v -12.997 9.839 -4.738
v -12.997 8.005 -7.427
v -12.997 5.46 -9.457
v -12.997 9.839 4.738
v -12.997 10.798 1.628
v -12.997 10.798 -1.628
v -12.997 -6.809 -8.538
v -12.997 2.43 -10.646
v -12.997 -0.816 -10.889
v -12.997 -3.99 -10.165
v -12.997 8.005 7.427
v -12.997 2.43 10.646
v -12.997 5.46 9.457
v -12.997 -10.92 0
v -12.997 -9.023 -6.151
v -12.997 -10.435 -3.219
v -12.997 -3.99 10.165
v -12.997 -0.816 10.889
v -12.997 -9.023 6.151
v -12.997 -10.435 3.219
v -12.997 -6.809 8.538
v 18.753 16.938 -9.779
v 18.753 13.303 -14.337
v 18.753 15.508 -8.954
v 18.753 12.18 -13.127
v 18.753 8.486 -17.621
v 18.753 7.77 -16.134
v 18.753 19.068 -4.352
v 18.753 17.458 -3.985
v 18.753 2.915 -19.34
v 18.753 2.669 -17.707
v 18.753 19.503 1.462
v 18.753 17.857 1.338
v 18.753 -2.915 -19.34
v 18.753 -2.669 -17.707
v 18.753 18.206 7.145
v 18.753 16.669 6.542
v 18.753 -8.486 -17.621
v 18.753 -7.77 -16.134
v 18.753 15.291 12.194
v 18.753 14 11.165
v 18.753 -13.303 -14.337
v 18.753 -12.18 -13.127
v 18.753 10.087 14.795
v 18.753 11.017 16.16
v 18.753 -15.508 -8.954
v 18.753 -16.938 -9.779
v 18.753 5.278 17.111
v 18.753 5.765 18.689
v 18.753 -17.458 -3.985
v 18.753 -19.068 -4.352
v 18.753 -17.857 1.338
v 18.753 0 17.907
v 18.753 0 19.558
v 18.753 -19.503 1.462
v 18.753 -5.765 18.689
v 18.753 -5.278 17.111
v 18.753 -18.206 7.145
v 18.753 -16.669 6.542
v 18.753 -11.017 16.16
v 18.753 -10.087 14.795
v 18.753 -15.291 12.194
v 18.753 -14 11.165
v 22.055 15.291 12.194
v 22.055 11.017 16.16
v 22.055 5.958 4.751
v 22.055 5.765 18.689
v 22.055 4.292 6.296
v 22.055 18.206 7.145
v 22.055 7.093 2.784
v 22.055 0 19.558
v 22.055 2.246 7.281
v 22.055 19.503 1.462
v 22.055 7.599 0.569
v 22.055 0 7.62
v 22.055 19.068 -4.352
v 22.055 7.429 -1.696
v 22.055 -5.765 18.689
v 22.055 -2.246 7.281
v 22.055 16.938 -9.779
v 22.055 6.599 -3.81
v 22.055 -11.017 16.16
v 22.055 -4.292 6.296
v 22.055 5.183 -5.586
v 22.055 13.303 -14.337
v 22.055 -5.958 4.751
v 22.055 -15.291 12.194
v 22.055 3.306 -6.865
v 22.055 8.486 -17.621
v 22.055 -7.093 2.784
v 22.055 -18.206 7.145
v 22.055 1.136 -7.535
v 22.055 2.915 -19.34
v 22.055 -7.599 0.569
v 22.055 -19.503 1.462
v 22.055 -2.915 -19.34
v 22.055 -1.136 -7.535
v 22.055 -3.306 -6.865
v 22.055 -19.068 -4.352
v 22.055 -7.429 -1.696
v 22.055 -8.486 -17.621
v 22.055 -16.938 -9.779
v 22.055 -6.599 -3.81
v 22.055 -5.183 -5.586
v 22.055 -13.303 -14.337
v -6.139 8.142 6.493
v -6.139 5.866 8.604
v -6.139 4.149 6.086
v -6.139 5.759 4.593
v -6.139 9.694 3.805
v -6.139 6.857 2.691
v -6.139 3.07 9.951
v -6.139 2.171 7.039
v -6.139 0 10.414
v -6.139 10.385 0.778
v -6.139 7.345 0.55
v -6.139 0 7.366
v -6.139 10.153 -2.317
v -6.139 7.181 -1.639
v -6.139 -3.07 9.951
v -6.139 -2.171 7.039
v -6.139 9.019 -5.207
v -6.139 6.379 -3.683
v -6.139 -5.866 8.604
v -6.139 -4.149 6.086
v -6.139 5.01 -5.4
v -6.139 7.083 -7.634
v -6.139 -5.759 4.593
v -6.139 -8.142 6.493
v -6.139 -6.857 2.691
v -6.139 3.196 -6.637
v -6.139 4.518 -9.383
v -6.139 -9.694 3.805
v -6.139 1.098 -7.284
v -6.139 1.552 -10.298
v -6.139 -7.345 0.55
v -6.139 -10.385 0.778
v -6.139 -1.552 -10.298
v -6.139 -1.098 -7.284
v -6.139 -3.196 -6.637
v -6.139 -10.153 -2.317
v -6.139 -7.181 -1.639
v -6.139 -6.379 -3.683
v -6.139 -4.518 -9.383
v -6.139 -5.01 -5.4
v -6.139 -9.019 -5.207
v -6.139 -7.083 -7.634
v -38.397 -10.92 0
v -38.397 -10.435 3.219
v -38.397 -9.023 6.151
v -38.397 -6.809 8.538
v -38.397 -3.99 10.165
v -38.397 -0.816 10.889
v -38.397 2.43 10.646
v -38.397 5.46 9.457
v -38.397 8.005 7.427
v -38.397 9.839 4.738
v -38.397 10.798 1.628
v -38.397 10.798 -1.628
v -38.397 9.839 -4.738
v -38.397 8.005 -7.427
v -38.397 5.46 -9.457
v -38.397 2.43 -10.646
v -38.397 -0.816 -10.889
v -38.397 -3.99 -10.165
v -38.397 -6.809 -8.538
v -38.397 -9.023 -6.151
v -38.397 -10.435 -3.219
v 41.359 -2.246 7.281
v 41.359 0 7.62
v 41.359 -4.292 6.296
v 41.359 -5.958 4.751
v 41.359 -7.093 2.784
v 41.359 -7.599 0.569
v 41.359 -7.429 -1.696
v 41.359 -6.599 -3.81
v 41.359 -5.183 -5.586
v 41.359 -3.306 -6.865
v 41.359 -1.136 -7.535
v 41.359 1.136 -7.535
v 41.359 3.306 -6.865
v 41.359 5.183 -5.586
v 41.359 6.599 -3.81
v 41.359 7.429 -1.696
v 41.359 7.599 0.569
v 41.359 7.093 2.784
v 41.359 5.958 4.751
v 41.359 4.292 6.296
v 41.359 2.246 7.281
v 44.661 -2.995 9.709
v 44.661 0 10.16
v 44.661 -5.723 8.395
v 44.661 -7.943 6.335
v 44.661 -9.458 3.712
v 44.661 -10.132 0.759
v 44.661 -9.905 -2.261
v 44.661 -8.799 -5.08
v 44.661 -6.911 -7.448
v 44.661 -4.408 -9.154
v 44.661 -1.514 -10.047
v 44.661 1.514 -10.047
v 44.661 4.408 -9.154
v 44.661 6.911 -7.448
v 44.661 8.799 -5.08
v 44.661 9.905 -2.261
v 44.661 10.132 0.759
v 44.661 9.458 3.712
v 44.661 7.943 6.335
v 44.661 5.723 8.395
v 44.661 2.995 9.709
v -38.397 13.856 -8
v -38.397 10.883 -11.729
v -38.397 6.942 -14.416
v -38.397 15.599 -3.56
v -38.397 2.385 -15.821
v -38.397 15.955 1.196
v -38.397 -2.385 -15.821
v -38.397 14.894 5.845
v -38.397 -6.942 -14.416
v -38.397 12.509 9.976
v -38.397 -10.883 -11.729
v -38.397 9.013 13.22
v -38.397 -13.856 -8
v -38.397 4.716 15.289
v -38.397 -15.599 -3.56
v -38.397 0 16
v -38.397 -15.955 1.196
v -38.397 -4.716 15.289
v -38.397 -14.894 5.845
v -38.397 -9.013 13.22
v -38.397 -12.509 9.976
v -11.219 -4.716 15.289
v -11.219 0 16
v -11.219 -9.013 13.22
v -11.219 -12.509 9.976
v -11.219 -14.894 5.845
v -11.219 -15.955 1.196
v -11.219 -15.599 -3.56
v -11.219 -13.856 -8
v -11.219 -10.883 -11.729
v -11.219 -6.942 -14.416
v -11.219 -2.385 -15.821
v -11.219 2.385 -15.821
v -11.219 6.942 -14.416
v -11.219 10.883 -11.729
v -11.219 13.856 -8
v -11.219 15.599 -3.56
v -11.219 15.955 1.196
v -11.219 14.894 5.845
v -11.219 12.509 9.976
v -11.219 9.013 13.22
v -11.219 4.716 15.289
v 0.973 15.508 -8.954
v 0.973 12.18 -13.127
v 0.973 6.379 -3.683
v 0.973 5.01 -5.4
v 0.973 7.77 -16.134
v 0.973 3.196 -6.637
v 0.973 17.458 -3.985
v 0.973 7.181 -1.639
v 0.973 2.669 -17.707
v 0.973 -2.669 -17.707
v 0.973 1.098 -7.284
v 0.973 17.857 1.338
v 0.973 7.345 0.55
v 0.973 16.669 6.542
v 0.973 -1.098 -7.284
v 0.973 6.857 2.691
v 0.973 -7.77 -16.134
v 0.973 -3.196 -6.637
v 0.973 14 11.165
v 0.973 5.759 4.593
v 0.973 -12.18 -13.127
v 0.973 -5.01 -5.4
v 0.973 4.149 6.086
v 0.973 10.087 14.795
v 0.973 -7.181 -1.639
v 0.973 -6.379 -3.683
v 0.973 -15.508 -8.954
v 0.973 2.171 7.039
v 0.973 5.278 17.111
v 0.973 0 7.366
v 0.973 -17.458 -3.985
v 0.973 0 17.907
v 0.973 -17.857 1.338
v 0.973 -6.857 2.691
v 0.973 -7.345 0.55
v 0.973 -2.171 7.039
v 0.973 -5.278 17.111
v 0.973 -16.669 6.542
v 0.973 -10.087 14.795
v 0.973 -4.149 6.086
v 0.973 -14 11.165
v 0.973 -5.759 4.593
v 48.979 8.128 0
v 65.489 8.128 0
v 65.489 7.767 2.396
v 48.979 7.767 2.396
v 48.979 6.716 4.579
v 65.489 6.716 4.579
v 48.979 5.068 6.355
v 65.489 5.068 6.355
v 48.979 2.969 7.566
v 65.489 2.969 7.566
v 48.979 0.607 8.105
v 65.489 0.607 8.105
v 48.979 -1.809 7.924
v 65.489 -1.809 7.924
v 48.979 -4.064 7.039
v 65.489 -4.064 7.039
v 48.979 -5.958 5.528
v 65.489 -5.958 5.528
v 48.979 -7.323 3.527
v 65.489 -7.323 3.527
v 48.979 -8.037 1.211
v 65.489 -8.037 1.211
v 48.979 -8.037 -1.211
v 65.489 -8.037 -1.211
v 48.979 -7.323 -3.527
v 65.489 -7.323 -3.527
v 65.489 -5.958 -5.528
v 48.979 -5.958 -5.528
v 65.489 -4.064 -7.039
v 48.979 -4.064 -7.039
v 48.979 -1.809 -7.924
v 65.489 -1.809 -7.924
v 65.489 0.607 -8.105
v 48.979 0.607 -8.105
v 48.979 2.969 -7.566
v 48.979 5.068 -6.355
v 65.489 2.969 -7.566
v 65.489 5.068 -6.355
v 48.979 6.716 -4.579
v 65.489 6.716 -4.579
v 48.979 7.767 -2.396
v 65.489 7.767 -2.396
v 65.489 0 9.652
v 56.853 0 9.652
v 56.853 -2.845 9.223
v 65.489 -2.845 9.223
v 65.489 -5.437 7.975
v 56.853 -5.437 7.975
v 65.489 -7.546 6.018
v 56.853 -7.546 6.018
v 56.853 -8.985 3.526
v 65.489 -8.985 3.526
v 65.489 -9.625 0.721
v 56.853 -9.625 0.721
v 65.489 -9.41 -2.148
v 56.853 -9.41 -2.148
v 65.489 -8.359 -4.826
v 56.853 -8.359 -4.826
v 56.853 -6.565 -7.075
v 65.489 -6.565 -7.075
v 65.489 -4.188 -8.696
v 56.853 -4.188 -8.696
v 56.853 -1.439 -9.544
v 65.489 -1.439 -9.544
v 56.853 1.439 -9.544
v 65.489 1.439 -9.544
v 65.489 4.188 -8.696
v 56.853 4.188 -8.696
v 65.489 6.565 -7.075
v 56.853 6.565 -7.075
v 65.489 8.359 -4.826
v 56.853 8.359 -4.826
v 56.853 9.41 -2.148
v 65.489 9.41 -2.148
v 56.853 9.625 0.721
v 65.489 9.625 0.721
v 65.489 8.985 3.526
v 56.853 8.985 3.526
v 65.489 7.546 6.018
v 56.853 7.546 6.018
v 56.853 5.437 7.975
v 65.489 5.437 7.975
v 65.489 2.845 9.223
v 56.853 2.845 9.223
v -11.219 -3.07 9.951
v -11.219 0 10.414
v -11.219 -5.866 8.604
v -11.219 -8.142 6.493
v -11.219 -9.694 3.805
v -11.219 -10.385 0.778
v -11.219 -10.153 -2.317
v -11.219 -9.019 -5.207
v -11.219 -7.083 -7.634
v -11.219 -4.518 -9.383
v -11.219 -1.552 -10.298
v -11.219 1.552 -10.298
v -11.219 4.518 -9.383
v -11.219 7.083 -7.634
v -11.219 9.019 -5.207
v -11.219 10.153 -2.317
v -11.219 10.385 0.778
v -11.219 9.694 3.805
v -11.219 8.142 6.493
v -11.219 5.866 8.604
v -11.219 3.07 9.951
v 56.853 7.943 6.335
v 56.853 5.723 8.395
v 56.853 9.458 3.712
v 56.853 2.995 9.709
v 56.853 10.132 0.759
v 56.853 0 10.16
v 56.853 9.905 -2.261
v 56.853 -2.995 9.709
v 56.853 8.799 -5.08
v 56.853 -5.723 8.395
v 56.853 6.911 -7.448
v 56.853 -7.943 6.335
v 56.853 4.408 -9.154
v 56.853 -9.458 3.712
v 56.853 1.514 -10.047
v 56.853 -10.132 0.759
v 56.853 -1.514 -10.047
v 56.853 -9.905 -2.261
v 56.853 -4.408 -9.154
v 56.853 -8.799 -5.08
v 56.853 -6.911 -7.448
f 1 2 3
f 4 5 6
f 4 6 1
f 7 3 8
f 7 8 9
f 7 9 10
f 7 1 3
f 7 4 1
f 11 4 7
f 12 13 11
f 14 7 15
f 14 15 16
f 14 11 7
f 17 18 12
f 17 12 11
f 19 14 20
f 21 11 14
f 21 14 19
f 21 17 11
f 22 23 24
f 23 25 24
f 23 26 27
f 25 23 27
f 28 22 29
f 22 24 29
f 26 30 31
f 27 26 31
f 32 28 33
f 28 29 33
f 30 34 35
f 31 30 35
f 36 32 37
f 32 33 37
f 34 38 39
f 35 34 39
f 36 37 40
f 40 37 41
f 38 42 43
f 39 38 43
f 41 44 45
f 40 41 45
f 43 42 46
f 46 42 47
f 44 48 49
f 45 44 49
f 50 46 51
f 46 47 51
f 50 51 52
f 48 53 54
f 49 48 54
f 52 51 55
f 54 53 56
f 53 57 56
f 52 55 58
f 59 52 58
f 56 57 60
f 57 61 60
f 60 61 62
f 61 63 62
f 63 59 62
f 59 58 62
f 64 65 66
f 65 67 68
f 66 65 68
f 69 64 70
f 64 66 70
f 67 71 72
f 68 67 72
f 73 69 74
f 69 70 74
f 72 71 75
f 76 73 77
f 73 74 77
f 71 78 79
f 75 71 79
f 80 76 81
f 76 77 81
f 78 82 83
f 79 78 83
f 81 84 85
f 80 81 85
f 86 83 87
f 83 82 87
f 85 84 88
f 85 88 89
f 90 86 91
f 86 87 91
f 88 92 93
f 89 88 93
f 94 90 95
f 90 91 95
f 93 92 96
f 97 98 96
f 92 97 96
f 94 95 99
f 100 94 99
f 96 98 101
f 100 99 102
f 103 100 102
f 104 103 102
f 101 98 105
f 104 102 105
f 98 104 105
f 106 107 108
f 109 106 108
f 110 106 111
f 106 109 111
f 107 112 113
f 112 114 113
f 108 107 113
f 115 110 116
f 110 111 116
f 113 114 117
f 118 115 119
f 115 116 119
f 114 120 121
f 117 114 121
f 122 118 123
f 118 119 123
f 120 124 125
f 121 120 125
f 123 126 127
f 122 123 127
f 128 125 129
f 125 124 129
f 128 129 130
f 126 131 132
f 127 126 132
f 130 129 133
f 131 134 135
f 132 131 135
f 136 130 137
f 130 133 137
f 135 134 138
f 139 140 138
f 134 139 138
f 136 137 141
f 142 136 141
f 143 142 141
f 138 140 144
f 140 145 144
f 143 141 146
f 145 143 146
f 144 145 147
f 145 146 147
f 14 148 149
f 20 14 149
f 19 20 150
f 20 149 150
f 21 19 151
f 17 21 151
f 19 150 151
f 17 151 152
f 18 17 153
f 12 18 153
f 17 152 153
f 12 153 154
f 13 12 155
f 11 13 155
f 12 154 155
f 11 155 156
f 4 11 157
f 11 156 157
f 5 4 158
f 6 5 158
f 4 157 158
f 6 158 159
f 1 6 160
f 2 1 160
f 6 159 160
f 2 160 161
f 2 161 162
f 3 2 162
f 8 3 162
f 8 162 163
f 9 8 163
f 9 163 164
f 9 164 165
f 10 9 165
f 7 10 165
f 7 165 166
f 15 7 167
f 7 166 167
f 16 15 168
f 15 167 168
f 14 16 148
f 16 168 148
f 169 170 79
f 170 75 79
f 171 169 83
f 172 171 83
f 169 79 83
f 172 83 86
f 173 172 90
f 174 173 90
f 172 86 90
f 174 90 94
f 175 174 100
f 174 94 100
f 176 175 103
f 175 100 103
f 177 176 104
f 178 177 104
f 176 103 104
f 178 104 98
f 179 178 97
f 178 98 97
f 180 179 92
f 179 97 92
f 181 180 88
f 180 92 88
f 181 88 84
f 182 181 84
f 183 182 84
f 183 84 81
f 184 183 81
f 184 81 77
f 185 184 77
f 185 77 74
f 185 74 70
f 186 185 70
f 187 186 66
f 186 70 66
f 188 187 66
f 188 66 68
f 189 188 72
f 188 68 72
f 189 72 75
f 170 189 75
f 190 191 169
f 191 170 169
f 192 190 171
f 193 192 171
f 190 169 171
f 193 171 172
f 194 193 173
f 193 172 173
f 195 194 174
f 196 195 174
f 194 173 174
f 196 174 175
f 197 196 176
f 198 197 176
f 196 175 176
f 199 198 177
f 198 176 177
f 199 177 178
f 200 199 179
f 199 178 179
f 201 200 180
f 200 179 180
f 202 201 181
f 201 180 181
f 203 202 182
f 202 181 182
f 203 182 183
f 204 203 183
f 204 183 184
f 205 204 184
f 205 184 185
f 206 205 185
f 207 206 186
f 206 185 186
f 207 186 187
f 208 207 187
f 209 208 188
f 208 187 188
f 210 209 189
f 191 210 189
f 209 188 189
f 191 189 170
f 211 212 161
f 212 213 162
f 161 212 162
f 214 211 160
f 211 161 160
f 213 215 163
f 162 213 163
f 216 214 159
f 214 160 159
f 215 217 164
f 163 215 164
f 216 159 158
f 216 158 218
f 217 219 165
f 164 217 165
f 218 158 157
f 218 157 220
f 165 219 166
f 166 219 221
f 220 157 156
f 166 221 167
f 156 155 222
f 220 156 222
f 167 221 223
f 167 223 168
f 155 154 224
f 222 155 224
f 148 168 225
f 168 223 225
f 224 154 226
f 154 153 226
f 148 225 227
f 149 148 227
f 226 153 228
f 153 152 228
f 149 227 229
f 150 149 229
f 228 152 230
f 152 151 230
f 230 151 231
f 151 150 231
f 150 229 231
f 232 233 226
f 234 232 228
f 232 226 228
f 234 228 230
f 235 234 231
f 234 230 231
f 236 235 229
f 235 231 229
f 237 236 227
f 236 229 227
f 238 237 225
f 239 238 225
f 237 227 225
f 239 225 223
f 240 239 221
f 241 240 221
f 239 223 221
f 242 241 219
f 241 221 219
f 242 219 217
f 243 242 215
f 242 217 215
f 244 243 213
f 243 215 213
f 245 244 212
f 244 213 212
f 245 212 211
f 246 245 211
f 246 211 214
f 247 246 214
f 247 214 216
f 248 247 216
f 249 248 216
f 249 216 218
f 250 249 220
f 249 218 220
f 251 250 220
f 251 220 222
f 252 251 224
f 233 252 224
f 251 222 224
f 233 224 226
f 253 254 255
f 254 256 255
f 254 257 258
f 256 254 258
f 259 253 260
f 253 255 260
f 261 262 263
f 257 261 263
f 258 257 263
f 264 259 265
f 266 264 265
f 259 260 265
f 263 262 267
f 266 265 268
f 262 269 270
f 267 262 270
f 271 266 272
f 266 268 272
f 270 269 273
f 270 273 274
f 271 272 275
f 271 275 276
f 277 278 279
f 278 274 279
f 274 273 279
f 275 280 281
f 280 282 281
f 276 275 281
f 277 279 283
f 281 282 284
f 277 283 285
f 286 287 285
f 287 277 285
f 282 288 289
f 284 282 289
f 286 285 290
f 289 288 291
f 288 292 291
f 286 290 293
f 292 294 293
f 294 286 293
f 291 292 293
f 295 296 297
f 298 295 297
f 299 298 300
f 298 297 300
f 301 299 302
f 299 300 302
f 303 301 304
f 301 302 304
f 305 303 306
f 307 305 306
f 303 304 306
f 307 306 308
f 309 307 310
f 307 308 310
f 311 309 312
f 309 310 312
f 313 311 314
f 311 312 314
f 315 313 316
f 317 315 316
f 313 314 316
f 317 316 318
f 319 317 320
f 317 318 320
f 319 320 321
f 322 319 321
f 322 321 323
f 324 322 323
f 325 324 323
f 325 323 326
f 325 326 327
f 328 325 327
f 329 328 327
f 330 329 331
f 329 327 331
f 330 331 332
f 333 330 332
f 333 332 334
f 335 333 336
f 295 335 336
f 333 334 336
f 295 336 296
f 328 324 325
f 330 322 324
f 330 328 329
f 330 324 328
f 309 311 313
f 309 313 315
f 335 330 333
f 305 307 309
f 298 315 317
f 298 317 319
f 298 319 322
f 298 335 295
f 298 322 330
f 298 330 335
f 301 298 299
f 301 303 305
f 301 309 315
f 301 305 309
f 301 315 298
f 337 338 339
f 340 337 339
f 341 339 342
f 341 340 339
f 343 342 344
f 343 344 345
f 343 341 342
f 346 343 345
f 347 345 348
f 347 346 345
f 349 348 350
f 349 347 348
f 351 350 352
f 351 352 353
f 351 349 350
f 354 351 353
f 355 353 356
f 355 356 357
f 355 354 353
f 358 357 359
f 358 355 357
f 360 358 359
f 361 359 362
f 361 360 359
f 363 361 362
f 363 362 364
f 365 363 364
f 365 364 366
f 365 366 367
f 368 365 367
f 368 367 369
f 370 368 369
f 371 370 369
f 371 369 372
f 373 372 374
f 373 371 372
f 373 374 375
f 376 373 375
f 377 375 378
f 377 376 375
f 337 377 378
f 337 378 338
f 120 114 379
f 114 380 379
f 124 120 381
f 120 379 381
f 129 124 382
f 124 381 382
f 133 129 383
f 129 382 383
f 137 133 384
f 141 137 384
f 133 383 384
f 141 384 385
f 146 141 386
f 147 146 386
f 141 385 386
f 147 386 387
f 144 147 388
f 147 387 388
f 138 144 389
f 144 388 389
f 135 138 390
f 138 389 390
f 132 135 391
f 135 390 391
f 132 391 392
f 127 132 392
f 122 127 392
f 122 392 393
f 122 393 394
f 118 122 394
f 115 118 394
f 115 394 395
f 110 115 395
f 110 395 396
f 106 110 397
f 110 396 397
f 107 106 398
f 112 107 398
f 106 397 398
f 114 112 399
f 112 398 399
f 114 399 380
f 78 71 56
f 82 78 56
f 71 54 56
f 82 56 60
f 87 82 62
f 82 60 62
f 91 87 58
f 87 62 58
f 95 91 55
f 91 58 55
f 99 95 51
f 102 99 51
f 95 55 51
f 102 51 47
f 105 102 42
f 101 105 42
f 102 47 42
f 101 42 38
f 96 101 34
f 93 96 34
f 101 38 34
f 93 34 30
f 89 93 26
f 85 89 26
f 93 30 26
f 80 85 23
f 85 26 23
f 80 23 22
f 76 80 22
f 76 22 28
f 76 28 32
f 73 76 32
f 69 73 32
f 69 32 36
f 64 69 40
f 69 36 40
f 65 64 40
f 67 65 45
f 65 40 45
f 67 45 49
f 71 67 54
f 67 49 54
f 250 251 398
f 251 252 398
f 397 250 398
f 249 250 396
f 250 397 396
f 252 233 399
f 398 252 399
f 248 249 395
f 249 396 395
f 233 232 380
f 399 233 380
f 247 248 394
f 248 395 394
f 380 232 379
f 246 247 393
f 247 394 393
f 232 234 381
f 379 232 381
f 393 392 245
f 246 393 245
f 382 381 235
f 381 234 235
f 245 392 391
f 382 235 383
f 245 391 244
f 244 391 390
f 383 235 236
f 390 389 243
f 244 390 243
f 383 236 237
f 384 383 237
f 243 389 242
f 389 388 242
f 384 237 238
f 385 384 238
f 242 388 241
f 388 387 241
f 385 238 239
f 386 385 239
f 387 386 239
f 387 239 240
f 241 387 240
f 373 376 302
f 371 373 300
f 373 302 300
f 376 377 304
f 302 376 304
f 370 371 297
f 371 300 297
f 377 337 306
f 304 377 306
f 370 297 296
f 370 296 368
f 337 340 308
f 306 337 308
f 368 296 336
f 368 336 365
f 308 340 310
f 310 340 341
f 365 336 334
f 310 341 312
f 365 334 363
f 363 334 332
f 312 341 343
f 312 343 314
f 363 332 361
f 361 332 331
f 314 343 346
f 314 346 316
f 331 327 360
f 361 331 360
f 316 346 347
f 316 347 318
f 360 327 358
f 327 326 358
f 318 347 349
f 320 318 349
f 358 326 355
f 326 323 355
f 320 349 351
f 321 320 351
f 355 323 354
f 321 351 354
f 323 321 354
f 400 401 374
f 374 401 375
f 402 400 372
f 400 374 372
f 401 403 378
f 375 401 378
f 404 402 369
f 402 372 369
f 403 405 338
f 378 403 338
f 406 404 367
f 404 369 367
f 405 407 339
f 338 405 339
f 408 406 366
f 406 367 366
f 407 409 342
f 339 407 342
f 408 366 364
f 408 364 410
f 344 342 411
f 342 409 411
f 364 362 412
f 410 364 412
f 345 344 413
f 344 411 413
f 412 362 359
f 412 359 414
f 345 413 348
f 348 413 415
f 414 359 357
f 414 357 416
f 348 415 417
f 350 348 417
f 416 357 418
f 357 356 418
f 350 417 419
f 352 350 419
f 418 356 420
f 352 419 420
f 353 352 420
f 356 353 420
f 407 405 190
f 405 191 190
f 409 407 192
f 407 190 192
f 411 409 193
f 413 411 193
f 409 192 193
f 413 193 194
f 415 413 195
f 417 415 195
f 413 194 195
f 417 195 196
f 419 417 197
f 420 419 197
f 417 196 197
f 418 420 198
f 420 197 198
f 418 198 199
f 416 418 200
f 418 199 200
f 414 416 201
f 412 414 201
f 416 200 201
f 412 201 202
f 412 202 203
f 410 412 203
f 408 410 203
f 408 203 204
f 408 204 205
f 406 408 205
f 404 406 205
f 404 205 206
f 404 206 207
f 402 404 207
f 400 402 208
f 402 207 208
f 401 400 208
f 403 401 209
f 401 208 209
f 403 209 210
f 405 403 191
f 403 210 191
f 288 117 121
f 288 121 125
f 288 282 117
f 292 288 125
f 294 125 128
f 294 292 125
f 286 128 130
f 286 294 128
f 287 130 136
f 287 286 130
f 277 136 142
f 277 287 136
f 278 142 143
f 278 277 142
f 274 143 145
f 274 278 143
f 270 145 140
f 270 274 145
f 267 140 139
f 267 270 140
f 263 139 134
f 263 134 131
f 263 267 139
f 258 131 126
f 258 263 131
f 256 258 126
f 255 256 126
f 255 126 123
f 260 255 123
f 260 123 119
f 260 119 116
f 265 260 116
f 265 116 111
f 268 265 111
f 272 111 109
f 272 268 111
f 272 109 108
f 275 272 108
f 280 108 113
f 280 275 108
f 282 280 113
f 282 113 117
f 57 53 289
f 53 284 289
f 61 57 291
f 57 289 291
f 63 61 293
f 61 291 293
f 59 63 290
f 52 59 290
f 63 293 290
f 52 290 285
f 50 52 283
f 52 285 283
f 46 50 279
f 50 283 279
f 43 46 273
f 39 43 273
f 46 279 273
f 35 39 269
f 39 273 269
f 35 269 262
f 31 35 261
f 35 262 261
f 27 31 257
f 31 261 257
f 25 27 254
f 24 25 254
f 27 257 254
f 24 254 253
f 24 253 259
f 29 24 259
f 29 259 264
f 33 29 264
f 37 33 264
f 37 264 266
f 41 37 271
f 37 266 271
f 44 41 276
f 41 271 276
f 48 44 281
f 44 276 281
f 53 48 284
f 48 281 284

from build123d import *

# Parameters (mm, degrees)
F0_W     = 7.112
F0_H     = 7.366
F0_W_2   = 8.636
F0_H_2   = 9.652
F4_R     = 10.92
F5_DEPTH = 25.4
F6_R     = 8.128
F7_DEPTH = 16.51


with BuildPart() as f1:
    # F0 (on Front) → F1 (revolve)
    with BuildSketch(Plane.XZ):
        Polygon((-38.397264, 16), (-38.397264, 0), (-11.219264, 0), (-11.219264, 10.414), (-11.219264, 16), align=None)
    revolve(axis=Axis((-8.996764, 0, 0), (1, 0, 0)))

    # F0 (on Front) → F2 (revolve)
    with BuildSketch(Plane.XZ):
        Polygon((-11.219264, 10.414), (-11.219264, 0), (-6.139264, 0), (-6.139264, 7.366), (-6.139264, 10.414), align=None)
    revolve(axis=Axis((-8.996764, 0, 0), (1, 0, 0)))

    # F0 (on Front) → F3 (revolve)
    with BuildSketch(Plane.XZ):
        Polygon((0.972736, 7.366), (0.972736, 0), (18.752736, 0), (18.752736, 17.907), (0.972736, 17.907), align=None)
        Polygon((18.752736, 17.907), (18.752736, 0), (20.403736, 0), (22.054736, 0), (22.054736, 7.62), (22.054736, 19.558), (18.752736, 19.558), align=None)
        with Locations((-2.583264, 3.683)):
            Rectangle(F0_W, F0_H)
        Polygon((22.054736, 7.62), (22.054736, 0), (22.72404, 0), (41.33619, 0), (41.33619, 7.62), align=None)
        Polygon((41.33619, 7.62), (41.33619, 0), (44.660736, 0), (44.660736, 10.16), (41.358736, 7.62), align=None)
        Polygon((44.660736, 10.16), (44.660736, 0), (56.852736, 0), (56.852736, 9.652), (56.852736, 10.16), align=None)
        with Locations((61.170736, 4.826)):
            Rectangle(F0_W_2, F0_H_2)
    revolve(axis=Axis((-8.996764, 0, 0), (1, 0, 0)))

    # F4 (on face) → F5 (cut)
    with BuildSketch(Plane(origin=(-38.397264, 0, 0), x_dir=(0, -1, 0), z_dir=(-1, 0, 0))):
        Circle(F4_R)
    extrude(amount=-F5_DEPTH, mode=Mode.SUBTRACT)

    # F6 (on face) → F7 (cut)
    with BuildSketch(Plane.YZ.offset(65.488736)):
        Circle(F6_R)
    extrude(amount=-F7_DEPTH, mode=Mode.SUBTRACT)


solid = f1.part
